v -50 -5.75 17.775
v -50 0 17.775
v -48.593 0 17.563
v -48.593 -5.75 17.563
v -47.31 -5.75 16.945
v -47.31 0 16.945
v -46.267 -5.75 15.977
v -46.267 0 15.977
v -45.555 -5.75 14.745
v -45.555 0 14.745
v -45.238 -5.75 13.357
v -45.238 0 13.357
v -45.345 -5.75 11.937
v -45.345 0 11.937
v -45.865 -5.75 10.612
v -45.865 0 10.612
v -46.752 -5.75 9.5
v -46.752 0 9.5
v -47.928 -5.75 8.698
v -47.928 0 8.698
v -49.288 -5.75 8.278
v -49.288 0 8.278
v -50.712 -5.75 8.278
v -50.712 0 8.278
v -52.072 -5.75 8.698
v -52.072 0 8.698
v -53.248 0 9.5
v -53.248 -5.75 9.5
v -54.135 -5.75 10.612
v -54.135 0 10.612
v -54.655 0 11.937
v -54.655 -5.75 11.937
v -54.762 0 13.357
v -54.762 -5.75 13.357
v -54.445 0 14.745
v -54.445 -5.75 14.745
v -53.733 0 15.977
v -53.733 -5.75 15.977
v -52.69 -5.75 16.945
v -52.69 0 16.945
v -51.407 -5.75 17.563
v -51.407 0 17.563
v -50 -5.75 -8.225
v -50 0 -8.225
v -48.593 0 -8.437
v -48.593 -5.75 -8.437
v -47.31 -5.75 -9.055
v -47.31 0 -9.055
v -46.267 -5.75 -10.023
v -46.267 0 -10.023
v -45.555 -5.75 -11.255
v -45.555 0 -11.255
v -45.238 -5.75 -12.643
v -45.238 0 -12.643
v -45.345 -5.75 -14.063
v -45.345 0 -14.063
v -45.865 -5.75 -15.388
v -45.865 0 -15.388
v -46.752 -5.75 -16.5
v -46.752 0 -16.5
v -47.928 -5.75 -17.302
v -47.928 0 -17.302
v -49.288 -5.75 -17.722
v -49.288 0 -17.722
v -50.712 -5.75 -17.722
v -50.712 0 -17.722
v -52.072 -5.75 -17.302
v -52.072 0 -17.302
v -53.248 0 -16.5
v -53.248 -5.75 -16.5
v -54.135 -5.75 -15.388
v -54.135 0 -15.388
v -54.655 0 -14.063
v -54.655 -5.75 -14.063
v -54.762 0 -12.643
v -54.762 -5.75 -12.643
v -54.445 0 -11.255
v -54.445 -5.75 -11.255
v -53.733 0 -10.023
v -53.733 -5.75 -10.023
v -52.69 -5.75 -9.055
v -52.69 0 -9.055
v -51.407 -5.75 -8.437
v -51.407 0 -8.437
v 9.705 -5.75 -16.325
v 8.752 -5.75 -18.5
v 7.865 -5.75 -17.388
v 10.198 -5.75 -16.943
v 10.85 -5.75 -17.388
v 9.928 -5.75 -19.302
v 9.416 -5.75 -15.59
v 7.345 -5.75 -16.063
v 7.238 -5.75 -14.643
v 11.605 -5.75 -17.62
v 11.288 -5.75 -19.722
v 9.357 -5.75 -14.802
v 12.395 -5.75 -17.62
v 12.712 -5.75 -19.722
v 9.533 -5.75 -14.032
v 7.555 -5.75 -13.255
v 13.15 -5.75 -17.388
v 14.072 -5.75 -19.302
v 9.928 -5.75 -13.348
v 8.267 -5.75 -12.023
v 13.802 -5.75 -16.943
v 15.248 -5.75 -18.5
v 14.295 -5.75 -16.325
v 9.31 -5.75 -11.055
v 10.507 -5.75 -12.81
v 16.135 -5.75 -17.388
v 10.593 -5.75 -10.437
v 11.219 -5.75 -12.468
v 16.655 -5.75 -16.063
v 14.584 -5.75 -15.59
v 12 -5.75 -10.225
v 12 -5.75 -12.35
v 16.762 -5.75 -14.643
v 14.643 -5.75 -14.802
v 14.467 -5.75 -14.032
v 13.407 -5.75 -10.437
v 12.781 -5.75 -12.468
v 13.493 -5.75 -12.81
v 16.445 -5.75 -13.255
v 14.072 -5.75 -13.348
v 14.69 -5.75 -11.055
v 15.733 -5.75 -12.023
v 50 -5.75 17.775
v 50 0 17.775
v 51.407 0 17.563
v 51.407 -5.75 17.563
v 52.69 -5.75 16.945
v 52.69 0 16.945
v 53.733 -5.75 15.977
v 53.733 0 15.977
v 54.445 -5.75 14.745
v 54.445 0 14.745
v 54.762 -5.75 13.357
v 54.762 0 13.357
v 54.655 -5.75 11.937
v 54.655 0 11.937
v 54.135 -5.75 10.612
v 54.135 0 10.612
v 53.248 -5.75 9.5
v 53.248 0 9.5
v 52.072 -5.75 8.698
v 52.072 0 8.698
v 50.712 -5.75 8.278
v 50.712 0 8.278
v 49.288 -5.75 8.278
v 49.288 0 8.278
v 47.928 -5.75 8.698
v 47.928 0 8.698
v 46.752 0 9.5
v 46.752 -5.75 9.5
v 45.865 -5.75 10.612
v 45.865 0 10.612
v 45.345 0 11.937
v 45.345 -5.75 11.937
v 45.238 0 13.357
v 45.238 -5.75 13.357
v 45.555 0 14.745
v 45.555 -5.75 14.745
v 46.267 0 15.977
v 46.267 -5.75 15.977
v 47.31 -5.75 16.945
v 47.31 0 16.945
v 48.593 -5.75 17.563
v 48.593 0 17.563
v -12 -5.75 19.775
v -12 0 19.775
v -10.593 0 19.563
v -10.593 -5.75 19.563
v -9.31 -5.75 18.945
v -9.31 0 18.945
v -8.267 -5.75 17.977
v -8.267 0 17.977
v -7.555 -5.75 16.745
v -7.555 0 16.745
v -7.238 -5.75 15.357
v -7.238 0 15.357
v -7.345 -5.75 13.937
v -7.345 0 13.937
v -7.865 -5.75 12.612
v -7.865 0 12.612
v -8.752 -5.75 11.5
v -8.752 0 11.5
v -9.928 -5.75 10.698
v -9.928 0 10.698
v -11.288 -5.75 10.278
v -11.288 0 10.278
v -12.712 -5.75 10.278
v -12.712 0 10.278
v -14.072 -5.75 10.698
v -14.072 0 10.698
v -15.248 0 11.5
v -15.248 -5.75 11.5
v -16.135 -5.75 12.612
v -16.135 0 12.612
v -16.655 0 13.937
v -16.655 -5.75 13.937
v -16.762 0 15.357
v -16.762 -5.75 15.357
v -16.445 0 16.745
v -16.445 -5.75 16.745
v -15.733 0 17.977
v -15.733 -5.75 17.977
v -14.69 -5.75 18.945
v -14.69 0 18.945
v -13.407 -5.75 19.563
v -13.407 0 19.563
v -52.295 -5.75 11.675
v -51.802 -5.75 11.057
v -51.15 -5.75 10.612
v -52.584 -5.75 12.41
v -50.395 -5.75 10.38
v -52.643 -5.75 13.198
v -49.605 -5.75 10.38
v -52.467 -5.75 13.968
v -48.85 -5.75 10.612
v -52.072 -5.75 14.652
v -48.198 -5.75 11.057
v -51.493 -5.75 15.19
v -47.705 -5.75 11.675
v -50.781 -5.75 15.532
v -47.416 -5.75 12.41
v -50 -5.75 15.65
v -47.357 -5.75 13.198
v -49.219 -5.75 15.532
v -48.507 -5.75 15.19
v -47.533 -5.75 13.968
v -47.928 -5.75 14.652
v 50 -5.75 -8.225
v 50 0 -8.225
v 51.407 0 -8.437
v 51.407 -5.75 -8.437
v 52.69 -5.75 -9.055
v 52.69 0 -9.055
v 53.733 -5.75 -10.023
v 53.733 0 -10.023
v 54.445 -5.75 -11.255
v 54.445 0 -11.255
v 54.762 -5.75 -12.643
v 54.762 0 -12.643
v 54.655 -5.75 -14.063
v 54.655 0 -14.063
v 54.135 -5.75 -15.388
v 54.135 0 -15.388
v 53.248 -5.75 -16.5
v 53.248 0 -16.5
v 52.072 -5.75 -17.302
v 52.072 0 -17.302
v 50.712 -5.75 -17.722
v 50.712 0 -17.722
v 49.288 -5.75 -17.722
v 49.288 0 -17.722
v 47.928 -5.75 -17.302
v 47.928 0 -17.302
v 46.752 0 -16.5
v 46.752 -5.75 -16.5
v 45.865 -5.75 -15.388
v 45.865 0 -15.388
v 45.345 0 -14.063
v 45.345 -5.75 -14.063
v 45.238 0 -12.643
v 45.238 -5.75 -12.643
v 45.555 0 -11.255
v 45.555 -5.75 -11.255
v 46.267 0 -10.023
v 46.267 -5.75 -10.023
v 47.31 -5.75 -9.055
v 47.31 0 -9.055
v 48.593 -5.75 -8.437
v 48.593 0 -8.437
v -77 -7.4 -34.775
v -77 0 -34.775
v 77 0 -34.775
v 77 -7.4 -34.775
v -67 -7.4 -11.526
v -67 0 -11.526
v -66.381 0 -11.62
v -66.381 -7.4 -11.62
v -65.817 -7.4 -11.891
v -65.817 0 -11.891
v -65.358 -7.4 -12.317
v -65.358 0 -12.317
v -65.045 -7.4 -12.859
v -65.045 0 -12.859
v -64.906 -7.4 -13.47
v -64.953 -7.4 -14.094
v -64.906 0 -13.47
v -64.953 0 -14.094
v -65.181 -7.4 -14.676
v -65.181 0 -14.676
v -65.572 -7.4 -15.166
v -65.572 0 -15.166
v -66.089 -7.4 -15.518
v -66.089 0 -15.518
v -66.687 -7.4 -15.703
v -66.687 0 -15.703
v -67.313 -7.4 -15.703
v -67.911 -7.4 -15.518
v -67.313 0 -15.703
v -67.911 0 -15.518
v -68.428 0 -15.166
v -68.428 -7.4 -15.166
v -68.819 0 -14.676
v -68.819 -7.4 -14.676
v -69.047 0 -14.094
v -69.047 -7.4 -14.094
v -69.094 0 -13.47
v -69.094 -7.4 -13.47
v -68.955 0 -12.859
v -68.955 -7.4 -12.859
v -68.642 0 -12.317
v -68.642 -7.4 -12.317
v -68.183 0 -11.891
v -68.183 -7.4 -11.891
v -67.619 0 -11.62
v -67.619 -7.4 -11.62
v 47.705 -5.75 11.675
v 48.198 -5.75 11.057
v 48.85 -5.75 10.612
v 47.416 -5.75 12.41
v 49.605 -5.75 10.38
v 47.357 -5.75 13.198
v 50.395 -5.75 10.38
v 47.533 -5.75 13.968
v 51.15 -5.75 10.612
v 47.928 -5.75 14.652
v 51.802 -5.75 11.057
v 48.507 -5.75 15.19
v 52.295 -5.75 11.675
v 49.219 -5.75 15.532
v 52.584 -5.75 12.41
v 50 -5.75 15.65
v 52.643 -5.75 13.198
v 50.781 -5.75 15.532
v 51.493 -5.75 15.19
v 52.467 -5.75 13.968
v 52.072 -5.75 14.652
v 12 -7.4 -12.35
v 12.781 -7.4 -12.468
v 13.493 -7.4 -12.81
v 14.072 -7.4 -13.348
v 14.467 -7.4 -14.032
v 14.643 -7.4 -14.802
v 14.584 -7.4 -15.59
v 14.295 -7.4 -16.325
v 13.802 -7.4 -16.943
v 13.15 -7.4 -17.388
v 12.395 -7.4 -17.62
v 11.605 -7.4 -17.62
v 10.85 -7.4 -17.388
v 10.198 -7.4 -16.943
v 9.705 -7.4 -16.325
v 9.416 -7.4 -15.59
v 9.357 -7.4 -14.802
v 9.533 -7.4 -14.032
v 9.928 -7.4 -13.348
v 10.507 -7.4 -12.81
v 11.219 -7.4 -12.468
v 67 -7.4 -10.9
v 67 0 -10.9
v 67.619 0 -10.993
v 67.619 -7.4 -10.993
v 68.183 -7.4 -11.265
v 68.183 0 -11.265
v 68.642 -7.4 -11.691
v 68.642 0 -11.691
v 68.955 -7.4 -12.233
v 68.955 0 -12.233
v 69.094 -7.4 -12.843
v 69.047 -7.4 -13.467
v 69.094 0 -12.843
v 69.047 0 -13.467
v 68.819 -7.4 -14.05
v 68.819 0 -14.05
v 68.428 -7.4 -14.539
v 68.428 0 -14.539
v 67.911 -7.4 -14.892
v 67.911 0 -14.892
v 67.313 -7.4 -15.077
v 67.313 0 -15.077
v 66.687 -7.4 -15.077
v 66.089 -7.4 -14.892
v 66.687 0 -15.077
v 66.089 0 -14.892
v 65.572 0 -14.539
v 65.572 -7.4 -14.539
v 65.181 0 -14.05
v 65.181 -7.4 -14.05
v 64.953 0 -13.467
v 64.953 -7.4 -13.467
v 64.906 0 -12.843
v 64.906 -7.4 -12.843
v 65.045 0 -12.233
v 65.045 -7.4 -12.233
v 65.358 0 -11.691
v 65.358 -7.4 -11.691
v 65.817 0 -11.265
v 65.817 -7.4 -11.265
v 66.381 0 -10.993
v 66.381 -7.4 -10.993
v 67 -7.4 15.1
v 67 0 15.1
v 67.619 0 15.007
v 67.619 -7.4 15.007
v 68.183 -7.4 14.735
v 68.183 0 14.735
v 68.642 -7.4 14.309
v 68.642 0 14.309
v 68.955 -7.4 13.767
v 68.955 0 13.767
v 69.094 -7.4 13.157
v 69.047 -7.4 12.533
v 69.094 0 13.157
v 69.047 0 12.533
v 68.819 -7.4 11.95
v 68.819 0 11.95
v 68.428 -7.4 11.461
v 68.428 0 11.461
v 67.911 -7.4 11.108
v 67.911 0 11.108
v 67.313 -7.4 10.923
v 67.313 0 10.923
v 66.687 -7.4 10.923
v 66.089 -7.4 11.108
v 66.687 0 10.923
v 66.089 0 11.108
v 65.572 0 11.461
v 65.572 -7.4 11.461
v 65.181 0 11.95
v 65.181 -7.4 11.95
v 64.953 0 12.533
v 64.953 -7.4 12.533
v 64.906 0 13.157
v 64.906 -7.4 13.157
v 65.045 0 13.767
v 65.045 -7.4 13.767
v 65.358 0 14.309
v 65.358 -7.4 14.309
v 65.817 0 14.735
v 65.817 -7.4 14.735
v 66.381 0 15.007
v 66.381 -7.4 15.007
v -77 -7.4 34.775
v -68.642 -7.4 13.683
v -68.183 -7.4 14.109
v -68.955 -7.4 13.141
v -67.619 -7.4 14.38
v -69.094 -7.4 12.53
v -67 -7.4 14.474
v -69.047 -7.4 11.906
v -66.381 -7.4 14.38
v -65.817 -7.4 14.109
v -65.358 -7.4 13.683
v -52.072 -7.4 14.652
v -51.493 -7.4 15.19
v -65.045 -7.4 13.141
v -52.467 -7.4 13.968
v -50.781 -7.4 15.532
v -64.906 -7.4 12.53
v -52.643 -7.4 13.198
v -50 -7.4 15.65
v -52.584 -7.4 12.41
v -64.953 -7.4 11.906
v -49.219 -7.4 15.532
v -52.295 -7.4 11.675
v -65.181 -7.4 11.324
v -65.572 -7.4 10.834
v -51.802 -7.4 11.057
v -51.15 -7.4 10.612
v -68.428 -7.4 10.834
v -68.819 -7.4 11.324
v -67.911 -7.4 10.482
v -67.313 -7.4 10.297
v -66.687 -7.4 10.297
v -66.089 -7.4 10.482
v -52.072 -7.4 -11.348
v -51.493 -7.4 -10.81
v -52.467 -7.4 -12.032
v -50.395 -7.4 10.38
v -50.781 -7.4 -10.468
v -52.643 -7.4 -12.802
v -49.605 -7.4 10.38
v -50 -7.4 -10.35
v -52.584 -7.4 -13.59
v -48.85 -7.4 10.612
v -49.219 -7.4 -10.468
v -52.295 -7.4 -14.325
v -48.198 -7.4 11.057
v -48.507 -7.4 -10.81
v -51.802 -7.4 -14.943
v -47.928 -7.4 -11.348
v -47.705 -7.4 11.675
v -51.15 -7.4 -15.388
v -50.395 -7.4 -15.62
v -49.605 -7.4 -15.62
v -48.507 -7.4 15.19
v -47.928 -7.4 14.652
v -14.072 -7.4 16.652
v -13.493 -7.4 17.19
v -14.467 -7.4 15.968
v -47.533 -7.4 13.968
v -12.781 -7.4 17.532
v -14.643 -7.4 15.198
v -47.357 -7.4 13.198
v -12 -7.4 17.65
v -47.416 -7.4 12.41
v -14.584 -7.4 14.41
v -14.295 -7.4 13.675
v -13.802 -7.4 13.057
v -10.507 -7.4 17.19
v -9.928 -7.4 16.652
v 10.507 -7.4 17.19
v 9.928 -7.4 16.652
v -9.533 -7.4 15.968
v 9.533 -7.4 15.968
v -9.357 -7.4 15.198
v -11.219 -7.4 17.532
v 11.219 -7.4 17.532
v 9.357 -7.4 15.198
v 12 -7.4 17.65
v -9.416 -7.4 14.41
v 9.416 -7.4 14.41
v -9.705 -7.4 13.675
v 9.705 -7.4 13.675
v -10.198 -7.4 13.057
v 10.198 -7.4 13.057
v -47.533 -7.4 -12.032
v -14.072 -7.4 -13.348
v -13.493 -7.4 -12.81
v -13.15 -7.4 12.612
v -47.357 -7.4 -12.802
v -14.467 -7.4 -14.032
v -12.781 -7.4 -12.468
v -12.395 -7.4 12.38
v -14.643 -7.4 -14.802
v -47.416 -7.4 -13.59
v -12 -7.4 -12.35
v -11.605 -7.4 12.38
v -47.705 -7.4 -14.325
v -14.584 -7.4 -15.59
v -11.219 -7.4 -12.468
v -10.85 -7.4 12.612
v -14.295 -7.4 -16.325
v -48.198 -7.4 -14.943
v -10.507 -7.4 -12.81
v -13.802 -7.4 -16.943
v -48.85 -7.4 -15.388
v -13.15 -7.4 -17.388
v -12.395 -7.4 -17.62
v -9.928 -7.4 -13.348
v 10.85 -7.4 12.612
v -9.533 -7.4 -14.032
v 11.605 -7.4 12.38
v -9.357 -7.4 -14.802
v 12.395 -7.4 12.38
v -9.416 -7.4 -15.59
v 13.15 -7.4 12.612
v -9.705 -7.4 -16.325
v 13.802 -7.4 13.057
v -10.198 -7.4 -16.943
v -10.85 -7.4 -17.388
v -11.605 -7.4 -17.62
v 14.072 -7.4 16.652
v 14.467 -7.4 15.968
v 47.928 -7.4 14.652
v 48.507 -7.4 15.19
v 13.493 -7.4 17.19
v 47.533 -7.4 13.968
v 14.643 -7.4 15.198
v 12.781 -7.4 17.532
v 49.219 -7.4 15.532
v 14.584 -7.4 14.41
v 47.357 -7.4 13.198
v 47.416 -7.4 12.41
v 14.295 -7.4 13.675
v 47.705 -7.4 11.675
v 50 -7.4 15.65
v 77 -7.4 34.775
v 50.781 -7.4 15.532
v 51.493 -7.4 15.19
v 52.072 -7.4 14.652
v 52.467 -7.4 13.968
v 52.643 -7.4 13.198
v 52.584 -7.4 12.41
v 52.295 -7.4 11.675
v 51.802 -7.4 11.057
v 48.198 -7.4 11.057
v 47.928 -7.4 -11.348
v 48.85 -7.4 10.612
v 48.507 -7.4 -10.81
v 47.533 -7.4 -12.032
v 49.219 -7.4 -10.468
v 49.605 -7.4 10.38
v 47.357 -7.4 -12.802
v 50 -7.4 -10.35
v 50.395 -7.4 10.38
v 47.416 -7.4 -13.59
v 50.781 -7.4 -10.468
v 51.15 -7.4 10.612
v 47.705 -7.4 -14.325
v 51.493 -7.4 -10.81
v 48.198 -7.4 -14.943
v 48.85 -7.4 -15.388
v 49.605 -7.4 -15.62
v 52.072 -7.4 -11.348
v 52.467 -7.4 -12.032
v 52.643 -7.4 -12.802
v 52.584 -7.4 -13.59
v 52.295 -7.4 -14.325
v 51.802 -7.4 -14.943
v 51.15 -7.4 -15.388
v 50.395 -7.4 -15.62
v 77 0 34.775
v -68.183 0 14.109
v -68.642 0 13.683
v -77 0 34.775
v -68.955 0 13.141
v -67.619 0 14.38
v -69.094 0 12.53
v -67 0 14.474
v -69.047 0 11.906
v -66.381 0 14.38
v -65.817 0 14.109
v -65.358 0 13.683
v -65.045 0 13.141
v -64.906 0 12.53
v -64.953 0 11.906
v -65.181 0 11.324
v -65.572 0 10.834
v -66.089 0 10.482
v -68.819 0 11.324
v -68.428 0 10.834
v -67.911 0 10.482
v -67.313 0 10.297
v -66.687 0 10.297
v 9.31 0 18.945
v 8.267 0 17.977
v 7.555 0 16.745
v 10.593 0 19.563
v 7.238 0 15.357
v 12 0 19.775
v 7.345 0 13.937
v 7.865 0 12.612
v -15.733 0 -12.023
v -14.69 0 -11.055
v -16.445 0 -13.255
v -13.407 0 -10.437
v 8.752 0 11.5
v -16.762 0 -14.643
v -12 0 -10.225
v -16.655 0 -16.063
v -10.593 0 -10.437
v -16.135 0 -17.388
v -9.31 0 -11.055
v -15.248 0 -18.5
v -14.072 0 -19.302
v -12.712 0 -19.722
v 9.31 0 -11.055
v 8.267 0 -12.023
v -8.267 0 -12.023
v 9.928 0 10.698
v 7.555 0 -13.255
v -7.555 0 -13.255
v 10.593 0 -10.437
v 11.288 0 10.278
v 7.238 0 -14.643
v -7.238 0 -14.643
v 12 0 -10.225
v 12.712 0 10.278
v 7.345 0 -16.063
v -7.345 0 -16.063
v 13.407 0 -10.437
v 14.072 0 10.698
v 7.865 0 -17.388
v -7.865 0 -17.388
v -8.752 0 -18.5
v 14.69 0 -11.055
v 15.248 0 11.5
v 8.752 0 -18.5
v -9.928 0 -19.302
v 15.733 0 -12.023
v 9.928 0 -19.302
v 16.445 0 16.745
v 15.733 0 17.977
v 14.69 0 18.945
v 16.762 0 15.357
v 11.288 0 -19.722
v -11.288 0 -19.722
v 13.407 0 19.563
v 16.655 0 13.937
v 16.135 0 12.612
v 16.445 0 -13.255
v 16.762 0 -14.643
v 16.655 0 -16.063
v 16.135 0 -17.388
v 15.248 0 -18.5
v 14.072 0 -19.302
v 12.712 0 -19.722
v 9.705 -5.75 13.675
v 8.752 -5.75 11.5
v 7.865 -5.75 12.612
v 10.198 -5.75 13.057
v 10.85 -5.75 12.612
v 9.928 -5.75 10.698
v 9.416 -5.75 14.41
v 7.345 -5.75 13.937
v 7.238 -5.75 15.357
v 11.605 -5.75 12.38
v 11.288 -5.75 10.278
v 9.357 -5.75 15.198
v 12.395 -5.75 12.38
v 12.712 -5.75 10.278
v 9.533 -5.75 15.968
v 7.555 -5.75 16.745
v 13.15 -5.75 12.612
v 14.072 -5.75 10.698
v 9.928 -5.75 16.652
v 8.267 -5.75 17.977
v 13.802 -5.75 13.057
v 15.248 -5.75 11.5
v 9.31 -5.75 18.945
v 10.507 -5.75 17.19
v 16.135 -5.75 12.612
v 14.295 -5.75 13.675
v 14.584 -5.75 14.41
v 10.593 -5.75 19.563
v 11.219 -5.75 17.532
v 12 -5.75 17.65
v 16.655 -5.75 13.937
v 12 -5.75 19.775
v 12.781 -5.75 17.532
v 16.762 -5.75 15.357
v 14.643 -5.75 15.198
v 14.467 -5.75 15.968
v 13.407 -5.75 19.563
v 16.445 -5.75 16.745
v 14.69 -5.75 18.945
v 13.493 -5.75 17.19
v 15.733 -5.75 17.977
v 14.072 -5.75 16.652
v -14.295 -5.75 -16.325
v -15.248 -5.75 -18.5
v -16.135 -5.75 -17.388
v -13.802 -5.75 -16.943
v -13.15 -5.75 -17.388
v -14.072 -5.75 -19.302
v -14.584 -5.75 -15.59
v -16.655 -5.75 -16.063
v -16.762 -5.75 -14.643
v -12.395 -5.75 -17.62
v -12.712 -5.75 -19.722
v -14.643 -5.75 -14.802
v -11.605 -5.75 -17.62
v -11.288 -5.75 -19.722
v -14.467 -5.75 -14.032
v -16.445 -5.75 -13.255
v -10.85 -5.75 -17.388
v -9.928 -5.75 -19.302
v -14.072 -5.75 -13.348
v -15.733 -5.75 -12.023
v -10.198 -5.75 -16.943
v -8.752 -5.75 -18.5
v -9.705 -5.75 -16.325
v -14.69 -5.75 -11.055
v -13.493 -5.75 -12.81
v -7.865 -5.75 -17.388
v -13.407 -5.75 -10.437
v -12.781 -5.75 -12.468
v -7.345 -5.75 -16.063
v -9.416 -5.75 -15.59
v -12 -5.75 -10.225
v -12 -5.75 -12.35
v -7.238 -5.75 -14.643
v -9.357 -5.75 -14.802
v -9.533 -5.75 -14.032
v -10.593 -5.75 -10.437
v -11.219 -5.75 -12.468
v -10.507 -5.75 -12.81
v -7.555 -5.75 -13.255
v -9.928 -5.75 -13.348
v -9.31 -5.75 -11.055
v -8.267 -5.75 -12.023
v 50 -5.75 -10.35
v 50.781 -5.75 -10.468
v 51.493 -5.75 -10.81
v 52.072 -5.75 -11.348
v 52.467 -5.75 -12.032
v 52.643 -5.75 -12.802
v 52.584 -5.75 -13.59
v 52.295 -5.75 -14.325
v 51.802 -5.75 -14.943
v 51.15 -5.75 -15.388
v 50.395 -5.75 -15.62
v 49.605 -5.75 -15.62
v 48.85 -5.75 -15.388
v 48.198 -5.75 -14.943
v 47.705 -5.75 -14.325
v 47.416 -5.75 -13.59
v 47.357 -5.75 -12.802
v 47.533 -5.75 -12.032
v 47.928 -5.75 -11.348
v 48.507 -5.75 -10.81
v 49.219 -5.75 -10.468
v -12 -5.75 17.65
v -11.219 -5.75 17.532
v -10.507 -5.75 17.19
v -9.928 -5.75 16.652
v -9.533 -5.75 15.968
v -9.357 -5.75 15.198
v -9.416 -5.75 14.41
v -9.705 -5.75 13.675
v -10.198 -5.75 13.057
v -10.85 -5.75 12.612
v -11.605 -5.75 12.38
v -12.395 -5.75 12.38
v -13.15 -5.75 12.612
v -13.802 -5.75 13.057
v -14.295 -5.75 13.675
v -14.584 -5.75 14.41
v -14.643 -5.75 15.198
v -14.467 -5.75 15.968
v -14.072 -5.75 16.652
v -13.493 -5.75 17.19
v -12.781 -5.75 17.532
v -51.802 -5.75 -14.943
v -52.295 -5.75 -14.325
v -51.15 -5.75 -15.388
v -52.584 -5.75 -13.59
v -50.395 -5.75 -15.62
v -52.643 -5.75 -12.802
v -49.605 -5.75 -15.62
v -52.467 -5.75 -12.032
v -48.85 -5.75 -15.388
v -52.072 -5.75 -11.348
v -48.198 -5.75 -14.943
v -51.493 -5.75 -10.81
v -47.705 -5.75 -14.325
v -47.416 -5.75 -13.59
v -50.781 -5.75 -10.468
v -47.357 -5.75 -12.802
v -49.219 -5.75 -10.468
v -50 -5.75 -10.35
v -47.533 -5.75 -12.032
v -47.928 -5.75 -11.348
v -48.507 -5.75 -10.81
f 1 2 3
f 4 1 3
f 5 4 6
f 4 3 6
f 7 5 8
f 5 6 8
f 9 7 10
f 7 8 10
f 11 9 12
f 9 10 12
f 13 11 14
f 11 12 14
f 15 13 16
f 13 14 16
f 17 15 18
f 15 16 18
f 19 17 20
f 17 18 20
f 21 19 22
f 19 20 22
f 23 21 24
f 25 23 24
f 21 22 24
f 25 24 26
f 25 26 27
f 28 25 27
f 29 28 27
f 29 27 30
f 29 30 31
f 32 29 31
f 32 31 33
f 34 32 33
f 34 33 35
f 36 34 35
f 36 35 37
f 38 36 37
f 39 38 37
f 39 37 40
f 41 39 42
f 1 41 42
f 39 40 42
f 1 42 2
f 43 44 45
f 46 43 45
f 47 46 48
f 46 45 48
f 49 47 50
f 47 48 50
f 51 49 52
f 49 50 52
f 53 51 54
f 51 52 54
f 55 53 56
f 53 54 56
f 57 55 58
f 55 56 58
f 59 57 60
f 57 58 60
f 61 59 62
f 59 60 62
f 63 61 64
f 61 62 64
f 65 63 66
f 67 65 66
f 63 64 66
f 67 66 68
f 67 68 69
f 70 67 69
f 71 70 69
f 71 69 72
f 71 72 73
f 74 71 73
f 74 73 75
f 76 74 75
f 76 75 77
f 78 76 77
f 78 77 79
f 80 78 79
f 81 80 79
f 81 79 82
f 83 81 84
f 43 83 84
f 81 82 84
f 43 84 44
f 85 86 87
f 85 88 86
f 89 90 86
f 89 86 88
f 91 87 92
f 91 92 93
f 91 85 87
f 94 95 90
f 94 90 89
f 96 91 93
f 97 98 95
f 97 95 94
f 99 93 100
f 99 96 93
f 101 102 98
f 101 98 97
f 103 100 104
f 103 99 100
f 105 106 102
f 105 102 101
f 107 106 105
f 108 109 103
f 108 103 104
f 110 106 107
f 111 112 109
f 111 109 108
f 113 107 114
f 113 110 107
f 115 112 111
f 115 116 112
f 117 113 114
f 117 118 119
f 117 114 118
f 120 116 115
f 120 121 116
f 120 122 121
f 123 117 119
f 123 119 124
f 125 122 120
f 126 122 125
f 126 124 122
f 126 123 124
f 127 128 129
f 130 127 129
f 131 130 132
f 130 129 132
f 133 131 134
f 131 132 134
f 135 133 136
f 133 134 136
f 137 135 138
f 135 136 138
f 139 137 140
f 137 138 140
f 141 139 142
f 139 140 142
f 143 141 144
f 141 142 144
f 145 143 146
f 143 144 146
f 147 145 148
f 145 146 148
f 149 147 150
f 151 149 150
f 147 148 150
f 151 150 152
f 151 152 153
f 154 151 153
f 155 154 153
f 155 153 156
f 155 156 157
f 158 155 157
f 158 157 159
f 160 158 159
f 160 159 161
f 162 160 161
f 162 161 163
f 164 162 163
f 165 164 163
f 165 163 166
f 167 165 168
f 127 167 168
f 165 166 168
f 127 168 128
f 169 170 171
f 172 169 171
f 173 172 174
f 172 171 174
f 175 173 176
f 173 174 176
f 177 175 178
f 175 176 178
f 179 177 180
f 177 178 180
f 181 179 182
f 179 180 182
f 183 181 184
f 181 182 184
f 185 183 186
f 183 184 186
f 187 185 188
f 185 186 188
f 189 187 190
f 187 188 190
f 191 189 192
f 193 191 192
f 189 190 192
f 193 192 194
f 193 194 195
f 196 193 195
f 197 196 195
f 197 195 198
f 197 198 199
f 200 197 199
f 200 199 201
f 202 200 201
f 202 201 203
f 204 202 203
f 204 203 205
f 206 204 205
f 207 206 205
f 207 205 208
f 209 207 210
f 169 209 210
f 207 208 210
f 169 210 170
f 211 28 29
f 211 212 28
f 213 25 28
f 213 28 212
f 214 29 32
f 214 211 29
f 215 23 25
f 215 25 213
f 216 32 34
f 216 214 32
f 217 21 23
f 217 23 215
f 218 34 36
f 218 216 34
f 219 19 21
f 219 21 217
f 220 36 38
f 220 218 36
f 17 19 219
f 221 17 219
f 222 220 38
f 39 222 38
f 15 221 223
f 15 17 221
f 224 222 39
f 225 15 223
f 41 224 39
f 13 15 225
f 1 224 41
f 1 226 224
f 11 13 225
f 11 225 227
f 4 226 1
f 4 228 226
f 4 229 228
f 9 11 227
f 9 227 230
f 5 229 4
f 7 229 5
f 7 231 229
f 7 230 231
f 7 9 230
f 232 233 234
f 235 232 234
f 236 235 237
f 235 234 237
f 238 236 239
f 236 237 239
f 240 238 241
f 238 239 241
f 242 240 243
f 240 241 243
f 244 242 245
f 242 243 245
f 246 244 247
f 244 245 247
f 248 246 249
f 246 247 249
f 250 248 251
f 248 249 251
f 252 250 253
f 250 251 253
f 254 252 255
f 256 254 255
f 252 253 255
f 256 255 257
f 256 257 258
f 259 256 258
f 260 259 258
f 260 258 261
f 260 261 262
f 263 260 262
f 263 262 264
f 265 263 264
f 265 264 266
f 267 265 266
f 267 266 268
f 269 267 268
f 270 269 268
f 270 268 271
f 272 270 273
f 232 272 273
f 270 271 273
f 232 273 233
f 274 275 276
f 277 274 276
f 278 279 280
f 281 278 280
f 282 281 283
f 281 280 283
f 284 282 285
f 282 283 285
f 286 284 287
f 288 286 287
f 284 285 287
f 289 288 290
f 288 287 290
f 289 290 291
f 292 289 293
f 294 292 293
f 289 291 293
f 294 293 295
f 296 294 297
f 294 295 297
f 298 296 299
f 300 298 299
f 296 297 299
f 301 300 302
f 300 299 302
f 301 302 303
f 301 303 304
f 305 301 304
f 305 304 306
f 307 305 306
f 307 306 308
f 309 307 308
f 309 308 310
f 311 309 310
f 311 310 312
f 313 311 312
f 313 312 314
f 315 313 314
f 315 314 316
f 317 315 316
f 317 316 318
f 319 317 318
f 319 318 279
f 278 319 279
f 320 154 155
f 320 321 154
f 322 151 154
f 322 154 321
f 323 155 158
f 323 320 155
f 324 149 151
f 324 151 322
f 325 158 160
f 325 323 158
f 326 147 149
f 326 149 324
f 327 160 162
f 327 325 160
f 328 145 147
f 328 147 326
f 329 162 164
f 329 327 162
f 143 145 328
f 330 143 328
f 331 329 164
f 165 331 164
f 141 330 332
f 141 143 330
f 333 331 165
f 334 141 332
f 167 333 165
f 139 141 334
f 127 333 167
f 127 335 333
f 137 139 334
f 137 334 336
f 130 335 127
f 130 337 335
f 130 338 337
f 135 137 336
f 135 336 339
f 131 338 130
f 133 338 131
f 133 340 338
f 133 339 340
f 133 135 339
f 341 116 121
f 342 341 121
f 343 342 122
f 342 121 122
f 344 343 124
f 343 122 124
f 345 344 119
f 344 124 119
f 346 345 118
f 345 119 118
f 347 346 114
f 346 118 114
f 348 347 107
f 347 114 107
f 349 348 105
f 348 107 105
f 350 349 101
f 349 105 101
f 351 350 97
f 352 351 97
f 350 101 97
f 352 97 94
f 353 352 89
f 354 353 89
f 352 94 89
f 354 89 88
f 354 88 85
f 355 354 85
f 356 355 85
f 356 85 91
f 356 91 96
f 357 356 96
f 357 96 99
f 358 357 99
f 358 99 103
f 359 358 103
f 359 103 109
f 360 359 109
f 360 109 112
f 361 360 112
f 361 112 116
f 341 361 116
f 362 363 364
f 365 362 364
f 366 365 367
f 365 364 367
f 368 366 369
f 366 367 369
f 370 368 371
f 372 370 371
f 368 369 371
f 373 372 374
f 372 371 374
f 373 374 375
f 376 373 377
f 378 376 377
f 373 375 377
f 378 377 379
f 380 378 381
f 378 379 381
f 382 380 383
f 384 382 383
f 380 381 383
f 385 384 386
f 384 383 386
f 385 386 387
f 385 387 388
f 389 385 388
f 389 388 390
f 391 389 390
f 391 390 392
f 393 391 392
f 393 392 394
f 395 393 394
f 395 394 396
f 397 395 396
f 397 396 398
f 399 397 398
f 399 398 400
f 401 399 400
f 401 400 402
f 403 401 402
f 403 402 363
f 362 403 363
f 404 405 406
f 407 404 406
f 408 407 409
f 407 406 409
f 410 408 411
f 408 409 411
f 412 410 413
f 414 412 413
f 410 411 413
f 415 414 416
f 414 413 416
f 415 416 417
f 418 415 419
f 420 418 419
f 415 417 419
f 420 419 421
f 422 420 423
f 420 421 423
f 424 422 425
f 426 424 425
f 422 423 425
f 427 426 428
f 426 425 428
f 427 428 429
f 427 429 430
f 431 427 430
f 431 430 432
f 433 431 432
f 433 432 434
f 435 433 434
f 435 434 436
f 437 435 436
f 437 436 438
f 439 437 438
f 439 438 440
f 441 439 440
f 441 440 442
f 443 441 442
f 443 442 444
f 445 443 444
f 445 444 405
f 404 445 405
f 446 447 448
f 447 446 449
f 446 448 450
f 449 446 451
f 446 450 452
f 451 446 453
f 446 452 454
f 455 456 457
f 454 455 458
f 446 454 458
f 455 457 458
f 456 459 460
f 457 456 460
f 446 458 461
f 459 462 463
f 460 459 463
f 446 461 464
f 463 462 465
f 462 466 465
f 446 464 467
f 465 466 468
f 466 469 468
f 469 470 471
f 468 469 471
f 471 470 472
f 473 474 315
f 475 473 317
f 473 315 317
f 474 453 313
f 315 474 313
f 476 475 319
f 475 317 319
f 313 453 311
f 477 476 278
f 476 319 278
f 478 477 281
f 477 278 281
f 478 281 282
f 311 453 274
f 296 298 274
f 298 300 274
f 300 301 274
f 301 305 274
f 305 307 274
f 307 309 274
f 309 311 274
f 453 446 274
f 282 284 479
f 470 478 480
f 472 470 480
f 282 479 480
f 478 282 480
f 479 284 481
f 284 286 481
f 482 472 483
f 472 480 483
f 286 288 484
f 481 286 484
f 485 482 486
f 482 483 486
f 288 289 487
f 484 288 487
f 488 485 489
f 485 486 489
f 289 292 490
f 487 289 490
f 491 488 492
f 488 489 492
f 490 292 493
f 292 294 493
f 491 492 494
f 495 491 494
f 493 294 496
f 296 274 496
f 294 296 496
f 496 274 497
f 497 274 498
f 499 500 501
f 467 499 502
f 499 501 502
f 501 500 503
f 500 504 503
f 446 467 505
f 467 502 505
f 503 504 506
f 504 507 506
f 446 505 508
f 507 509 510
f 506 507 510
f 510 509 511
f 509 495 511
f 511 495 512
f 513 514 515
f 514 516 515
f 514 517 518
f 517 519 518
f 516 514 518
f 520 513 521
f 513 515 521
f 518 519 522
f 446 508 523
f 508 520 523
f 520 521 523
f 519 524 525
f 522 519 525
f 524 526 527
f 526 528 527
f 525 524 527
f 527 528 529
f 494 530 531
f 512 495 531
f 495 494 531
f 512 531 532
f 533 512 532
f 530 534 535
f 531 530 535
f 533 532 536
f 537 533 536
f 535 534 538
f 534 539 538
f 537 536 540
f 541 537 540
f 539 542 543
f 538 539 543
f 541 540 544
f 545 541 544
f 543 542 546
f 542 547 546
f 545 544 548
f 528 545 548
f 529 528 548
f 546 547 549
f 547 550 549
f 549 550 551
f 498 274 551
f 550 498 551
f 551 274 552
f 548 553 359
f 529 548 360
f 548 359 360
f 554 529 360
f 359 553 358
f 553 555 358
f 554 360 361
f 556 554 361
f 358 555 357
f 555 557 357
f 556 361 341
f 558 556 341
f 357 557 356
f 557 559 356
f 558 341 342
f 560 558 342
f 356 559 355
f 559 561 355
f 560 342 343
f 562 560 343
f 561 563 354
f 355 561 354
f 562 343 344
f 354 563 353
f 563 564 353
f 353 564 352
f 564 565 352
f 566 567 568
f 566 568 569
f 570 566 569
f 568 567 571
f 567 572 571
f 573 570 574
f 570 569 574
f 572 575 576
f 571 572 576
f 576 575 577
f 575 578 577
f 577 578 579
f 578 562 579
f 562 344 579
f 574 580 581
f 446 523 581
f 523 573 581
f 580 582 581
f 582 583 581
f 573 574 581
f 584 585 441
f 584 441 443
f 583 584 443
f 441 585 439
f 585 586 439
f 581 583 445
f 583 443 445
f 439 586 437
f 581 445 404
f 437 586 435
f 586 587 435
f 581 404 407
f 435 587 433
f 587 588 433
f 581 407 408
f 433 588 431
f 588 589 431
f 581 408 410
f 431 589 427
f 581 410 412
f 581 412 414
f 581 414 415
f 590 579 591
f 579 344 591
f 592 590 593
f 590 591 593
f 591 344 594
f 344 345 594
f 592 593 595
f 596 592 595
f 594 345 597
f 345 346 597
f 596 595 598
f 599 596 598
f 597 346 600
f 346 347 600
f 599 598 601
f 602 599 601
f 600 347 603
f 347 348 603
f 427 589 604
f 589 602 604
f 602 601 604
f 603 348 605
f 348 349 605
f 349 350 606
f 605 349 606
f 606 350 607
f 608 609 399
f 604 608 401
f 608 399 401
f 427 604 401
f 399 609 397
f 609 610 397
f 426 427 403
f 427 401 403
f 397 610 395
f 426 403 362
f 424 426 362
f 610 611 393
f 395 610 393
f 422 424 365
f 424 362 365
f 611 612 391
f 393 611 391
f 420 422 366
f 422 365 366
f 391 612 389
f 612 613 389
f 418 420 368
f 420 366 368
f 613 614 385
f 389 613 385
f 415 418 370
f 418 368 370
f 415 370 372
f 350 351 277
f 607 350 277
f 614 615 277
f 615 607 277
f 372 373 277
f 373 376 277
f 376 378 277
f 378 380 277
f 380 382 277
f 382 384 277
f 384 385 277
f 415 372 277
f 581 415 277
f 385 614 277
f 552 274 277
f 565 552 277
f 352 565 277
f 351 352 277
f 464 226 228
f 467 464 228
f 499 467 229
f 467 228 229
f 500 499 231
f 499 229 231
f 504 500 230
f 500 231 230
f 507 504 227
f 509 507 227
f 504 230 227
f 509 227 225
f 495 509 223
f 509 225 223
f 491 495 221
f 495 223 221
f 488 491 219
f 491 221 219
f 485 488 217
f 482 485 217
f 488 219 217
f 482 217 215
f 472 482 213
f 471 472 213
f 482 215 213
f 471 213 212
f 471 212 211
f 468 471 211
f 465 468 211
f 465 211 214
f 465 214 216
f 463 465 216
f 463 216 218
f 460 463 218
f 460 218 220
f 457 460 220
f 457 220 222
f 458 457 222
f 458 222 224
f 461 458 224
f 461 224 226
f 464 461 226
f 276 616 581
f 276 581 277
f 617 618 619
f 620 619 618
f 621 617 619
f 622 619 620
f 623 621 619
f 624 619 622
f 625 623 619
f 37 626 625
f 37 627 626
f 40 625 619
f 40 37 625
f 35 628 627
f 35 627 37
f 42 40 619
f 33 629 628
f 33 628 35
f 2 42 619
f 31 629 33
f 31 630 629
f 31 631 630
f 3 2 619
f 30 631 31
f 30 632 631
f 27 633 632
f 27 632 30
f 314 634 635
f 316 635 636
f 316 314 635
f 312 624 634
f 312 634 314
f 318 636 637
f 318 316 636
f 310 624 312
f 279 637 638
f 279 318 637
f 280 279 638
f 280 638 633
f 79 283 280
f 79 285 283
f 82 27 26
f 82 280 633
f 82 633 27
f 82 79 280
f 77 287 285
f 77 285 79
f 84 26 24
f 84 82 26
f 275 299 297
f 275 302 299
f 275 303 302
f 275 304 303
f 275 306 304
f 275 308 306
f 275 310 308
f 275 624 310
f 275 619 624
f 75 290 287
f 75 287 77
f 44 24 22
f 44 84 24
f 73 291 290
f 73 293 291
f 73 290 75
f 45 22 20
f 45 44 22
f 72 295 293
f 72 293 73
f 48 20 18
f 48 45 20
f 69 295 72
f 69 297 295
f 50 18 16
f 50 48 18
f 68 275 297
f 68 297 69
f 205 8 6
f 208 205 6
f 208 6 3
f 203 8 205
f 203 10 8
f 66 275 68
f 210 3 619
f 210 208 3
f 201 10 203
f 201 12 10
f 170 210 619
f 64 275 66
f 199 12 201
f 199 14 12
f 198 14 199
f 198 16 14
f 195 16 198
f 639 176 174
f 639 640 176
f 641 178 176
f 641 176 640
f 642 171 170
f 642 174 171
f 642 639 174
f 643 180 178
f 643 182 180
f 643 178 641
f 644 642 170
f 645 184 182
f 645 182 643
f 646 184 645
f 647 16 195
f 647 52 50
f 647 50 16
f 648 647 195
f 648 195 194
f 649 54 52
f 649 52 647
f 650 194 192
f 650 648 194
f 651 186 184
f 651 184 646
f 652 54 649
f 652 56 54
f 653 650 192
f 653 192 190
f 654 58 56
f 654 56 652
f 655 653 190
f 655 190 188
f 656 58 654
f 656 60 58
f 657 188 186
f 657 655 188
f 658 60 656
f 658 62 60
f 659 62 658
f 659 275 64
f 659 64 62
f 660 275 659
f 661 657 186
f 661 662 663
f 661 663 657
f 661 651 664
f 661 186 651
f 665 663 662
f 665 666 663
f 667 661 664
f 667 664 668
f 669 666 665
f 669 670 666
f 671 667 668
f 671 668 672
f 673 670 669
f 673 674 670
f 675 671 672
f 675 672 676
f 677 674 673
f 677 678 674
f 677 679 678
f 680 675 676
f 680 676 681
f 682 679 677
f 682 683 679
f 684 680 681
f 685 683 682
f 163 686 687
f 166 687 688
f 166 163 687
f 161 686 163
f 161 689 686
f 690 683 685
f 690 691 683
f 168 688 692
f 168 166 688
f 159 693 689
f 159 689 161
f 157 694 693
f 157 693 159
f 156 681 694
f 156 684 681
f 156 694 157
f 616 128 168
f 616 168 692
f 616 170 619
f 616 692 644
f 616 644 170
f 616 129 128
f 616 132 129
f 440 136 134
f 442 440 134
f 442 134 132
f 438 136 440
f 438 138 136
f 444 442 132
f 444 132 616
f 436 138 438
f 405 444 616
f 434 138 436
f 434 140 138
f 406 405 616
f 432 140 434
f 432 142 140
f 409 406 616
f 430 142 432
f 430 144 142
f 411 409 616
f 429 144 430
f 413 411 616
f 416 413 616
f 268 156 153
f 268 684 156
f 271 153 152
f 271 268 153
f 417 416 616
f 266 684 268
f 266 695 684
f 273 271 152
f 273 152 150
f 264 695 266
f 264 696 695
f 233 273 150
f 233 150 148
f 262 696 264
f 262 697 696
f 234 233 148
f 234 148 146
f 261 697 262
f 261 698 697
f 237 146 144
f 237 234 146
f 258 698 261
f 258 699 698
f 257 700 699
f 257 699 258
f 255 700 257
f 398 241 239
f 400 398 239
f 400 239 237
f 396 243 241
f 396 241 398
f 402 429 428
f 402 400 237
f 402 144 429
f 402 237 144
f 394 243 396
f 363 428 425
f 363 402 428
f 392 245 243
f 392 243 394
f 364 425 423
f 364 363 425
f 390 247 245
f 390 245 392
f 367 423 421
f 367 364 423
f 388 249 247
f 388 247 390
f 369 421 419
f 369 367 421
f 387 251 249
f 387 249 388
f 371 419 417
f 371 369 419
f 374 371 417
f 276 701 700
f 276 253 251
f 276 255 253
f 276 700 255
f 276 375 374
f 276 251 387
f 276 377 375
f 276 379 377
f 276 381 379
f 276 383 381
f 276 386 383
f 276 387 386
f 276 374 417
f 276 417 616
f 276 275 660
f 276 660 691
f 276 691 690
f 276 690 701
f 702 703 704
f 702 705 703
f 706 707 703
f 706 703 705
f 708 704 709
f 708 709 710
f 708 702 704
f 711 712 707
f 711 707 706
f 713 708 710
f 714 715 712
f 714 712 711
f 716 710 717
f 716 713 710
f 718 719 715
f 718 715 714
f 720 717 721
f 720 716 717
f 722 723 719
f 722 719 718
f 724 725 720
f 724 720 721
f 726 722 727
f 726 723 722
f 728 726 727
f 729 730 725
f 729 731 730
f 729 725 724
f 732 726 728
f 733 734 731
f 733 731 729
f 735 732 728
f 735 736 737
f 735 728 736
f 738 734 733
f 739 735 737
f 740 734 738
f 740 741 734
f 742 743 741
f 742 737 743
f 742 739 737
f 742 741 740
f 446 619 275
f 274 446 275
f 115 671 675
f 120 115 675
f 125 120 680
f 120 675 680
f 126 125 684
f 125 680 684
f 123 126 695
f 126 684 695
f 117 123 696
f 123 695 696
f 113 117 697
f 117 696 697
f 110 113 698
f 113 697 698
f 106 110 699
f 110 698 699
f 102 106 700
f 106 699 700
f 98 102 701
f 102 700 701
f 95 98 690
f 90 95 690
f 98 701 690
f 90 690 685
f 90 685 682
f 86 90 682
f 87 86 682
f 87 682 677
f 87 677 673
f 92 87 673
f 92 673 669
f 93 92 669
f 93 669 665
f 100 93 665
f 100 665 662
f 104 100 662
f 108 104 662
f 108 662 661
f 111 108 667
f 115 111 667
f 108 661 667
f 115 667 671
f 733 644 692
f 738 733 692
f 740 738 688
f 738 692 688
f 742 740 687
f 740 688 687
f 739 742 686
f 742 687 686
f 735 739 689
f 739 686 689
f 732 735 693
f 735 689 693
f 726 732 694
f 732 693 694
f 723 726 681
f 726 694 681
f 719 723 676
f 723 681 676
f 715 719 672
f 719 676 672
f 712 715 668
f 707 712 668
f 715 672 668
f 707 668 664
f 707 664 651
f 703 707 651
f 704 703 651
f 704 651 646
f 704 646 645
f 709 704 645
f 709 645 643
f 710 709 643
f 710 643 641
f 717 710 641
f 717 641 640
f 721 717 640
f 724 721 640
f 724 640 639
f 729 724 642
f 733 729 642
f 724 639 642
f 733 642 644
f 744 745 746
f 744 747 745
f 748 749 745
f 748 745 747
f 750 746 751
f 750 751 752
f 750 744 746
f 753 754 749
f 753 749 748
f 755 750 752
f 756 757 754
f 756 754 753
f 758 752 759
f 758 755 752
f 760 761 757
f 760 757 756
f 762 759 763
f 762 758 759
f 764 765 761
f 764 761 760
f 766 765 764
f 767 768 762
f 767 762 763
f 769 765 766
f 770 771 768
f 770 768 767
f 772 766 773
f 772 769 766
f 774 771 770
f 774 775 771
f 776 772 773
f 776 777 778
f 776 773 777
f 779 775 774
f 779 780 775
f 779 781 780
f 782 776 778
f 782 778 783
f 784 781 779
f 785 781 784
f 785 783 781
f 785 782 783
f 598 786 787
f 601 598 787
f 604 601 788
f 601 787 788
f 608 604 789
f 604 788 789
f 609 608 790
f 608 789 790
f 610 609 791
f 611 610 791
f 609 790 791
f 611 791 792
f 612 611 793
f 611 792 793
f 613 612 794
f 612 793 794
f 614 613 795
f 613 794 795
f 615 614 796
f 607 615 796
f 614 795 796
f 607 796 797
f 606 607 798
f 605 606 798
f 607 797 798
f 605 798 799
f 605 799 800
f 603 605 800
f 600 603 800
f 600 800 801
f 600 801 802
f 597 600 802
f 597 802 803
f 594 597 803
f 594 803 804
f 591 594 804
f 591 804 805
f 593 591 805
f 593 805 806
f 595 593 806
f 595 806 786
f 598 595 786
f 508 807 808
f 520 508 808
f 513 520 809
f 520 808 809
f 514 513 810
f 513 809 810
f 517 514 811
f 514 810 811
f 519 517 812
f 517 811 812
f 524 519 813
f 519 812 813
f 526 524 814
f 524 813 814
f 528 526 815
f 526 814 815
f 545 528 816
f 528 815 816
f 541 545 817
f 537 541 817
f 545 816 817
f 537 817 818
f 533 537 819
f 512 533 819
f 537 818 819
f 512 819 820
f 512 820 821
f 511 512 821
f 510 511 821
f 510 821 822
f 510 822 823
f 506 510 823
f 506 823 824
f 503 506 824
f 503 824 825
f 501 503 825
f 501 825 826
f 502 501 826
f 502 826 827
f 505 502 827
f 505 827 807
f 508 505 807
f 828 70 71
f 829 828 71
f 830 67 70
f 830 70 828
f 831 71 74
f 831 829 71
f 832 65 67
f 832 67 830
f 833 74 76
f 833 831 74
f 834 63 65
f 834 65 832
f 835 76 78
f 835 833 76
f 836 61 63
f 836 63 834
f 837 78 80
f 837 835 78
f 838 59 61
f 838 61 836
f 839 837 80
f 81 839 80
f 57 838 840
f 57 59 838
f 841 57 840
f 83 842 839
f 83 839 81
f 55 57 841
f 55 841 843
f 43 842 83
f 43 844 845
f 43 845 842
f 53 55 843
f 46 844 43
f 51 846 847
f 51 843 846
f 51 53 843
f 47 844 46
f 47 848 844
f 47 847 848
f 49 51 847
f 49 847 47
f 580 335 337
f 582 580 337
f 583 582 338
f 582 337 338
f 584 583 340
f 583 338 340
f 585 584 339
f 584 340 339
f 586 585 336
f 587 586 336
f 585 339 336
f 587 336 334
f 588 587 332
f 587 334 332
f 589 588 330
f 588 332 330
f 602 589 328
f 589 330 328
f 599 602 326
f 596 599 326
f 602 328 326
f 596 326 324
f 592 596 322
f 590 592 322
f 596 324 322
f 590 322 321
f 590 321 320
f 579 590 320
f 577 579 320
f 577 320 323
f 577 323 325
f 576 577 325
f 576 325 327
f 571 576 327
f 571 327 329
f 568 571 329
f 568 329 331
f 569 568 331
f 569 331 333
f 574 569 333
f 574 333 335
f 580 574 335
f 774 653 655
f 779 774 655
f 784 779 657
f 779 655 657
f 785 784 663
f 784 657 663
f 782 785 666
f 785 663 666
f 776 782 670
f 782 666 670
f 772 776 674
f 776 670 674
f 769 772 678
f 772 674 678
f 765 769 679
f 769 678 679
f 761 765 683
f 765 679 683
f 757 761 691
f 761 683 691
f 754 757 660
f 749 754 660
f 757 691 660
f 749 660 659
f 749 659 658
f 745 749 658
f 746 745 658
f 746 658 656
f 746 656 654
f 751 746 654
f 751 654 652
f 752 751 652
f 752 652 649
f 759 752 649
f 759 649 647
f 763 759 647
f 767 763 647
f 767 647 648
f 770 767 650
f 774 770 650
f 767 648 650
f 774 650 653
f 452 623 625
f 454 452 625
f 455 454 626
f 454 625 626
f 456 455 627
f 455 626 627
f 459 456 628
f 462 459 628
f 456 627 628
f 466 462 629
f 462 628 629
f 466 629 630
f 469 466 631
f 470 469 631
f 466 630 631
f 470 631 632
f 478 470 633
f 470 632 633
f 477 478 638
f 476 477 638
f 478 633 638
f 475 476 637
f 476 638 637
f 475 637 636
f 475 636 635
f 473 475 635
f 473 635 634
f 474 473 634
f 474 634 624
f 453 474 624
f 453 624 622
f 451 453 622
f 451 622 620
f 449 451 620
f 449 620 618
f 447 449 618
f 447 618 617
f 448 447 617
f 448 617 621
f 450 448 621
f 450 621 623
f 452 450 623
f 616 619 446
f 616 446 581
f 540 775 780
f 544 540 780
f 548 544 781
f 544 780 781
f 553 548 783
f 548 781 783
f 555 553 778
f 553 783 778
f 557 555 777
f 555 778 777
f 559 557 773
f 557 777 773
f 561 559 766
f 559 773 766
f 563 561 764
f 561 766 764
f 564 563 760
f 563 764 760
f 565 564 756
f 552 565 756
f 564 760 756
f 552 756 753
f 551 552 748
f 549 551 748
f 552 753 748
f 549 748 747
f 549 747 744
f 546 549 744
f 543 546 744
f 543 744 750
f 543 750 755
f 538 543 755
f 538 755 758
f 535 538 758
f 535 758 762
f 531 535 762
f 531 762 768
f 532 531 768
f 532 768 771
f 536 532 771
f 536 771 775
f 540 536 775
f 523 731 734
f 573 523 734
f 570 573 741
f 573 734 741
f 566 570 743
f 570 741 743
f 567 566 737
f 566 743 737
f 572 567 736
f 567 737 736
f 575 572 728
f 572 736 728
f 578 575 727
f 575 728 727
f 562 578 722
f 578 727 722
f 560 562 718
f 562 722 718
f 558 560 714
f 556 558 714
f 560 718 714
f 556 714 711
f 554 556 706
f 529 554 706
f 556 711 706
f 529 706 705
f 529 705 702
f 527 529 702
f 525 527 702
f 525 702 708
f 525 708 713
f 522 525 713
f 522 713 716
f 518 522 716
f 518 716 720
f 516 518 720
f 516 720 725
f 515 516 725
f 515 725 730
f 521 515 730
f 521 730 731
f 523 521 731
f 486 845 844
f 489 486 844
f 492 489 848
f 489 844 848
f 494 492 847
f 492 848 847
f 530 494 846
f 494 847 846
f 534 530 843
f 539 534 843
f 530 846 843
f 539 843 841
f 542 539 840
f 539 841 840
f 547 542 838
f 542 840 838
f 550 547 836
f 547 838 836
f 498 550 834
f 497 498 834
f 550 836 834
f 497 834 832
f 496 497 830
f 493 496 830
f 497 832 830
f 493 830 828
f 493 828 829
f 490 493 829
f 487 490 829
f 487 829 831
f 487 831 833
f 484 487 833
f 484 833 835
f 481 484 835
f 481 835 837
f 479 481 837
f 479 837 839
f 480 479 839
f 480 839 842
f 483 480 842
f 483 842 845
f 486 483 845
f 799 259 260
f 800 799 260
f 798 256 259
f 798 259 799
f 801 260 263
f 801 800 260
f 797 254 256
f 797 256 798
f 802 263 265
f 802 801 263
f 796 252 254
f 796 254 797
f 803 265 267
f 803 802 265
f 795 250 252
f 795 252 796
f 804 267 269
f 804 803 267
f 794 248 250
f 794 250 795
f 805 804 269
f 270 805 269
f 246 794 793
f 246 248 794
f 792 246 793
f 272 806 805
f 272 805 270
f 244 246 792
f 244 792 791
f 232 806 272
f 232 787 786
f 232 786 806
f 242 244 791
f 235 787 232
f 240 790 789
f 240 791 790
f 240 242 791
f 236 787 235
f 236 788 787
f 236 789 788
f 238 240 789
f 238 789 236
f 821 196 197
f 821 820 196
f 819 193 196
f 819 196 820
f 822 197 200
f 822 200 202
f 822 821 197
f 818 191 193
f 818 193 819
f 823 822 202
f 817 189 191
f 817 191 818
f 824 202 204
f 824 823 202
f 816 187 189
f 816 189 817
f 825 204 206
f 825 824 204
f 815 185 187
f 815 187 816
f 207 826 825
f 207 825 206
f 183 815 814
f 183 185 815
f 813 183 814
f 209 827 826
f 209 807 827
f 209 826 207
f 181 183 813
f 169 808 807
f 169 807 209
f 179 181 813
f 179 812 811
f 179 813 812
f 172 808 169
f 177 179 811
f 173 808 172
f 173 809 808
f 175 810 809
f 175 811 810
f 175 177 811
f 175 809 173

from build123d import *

# Parameters (mm, degrees)
ESBO_O1_W             = 154
ESBO_O1_H             = 69.55
FLANGE_BASE1_DEPTH    = 7.4
ESBO_O6_R             = 4.775
CORTE_EXTRUS_O1_DEPTH = 5.75
ESBO_O8_R             = 2.65
CORTE_EXTRUS_O3_DEPTH = 85.683901215
ESBO_O10_R            = 2.1
CORTE_EXTRUS_O4_DEPTH = 85.811913226


# Sheet-metal steps are written as plain solids
with BuildPart() as part:
    # Esboço1 → Flange-base1 (new body)
    with BuildSketch(Plane(origin=(0, 0, 0), x_dir=(1, 0, 0), z_dir=(0, 1, 0))):
        Rectangle(ESBO_O1_W, ESBO_O1_H)
    extrude(amount=-FLANGE_BASE1_DEPTH)

    # Esboço6 → Corte-extrusão1 (cut)
    with BuildSketch(Plane(origin=(0, 0, 0), x_dir=(1, 0, 0), z_dir=(0, 1, 0))):
        with Locations(Location((-50, 13, 0), (0, 0, 270))):
            Circle(ESBO_O6_R)
        with Locations(Location((-50, -13, 0), (0, 0, 270))):
            Circle(ESBO_O6_R)
        with Locations(Location((-12, 15, 0), (0, 0, 270))):
            Circle(ESBO_O6_R)
        with Locations(Location((12, 15, 0), (0, 0, 270))):
            Circle(ESBO_O6_R)
        with Locations(Location((12, -15, 0), (0, 0, 270))):
            Circle(ESBO_O6_R)
        with Locations(Location((50, 13, 0), (0, 0, 270))):
            Circle(ESBO_O6_R)
        with Locations(Location((50, -13, 0), (0, 0, 270))):
            Circle(ESBO_O6_R)
        with Locations(Location((-12, -15, 0), (0, 0, 270))):
            Circle(ESBO_O6_R)
    extrude(amount=-CORTE_EXTRUS_O1_DEPTH, mode=Mode.SUBTRACT)

    # Esboço8 → Corte-extrusão3 (cut, through all)
    with BuildSketch(Plane(origin=(0, -5.75, 0), x_dir=(1, 0, 0), z_dir=(0, 1, 0))):
        with Locations(Location((-50, 13, 0), (0, 0, 270))):
            Circle(ESBO_O8_R)
        with Locations(Location((-50, -13, 0), (0, 0, 270))):
            Circle(ESBO_O8_R)
        with Locations(Location((-12, 15, 0), (0, 0, 270))):
            Circle(ESBO_O8_R)
        with Locations(Location((12, 15, 0), (0, 0, 270))):
            Circle(ESBO_O8_R)
        with Locations(Location((12, -15, 0), (0, 0, 270))):
            Circle(ESBO_O8_R)
        with Locations(Location((50, 13, 0), (0, 0, 270))):
            Circle(ESBO_O8_R)
        with Locations(Location((50, -13, 0), (0, 0, 270))):
            Circle(ESBO_O8_R)
        with Locations(Location((-12, -15, 0), (0, 0, 270))):
            Circle(ESBO_O8_R)
    extrude(amount=-CORTE_EXTRUS_O3_DEPTH, mode=Mode.SUBTRACT)

    # Esboço10 → Corte-extrusão4 (cut, through all)
    with BuildSketch(Plane(origin=(0, 0, 0), x_dir=(1, 0, 0), z_dir=(0, 1, 0))):
        with Locations(Location((-67, 13.626456062, 0), (0, 0, 270))):
            Circle(ESBO_O10_R)
        with Locations(Location((-67, -12.373543938, 0), (0, 0, 270))):
            Circle(ESBO_O10_R)
        with Locations(Location((67, 13, 0), (0, 0, 270))):
            Circle(ESBO_O10_R)
        with Locations(Location((67, -13, 0), (0, 0, 270))):
            Circle(ESBO_O10_R)
    extrude(amount=-CORTE_EXTRUS_O4_DEPTH, mode=Mode.SUBTRACT)


solid = part.part
